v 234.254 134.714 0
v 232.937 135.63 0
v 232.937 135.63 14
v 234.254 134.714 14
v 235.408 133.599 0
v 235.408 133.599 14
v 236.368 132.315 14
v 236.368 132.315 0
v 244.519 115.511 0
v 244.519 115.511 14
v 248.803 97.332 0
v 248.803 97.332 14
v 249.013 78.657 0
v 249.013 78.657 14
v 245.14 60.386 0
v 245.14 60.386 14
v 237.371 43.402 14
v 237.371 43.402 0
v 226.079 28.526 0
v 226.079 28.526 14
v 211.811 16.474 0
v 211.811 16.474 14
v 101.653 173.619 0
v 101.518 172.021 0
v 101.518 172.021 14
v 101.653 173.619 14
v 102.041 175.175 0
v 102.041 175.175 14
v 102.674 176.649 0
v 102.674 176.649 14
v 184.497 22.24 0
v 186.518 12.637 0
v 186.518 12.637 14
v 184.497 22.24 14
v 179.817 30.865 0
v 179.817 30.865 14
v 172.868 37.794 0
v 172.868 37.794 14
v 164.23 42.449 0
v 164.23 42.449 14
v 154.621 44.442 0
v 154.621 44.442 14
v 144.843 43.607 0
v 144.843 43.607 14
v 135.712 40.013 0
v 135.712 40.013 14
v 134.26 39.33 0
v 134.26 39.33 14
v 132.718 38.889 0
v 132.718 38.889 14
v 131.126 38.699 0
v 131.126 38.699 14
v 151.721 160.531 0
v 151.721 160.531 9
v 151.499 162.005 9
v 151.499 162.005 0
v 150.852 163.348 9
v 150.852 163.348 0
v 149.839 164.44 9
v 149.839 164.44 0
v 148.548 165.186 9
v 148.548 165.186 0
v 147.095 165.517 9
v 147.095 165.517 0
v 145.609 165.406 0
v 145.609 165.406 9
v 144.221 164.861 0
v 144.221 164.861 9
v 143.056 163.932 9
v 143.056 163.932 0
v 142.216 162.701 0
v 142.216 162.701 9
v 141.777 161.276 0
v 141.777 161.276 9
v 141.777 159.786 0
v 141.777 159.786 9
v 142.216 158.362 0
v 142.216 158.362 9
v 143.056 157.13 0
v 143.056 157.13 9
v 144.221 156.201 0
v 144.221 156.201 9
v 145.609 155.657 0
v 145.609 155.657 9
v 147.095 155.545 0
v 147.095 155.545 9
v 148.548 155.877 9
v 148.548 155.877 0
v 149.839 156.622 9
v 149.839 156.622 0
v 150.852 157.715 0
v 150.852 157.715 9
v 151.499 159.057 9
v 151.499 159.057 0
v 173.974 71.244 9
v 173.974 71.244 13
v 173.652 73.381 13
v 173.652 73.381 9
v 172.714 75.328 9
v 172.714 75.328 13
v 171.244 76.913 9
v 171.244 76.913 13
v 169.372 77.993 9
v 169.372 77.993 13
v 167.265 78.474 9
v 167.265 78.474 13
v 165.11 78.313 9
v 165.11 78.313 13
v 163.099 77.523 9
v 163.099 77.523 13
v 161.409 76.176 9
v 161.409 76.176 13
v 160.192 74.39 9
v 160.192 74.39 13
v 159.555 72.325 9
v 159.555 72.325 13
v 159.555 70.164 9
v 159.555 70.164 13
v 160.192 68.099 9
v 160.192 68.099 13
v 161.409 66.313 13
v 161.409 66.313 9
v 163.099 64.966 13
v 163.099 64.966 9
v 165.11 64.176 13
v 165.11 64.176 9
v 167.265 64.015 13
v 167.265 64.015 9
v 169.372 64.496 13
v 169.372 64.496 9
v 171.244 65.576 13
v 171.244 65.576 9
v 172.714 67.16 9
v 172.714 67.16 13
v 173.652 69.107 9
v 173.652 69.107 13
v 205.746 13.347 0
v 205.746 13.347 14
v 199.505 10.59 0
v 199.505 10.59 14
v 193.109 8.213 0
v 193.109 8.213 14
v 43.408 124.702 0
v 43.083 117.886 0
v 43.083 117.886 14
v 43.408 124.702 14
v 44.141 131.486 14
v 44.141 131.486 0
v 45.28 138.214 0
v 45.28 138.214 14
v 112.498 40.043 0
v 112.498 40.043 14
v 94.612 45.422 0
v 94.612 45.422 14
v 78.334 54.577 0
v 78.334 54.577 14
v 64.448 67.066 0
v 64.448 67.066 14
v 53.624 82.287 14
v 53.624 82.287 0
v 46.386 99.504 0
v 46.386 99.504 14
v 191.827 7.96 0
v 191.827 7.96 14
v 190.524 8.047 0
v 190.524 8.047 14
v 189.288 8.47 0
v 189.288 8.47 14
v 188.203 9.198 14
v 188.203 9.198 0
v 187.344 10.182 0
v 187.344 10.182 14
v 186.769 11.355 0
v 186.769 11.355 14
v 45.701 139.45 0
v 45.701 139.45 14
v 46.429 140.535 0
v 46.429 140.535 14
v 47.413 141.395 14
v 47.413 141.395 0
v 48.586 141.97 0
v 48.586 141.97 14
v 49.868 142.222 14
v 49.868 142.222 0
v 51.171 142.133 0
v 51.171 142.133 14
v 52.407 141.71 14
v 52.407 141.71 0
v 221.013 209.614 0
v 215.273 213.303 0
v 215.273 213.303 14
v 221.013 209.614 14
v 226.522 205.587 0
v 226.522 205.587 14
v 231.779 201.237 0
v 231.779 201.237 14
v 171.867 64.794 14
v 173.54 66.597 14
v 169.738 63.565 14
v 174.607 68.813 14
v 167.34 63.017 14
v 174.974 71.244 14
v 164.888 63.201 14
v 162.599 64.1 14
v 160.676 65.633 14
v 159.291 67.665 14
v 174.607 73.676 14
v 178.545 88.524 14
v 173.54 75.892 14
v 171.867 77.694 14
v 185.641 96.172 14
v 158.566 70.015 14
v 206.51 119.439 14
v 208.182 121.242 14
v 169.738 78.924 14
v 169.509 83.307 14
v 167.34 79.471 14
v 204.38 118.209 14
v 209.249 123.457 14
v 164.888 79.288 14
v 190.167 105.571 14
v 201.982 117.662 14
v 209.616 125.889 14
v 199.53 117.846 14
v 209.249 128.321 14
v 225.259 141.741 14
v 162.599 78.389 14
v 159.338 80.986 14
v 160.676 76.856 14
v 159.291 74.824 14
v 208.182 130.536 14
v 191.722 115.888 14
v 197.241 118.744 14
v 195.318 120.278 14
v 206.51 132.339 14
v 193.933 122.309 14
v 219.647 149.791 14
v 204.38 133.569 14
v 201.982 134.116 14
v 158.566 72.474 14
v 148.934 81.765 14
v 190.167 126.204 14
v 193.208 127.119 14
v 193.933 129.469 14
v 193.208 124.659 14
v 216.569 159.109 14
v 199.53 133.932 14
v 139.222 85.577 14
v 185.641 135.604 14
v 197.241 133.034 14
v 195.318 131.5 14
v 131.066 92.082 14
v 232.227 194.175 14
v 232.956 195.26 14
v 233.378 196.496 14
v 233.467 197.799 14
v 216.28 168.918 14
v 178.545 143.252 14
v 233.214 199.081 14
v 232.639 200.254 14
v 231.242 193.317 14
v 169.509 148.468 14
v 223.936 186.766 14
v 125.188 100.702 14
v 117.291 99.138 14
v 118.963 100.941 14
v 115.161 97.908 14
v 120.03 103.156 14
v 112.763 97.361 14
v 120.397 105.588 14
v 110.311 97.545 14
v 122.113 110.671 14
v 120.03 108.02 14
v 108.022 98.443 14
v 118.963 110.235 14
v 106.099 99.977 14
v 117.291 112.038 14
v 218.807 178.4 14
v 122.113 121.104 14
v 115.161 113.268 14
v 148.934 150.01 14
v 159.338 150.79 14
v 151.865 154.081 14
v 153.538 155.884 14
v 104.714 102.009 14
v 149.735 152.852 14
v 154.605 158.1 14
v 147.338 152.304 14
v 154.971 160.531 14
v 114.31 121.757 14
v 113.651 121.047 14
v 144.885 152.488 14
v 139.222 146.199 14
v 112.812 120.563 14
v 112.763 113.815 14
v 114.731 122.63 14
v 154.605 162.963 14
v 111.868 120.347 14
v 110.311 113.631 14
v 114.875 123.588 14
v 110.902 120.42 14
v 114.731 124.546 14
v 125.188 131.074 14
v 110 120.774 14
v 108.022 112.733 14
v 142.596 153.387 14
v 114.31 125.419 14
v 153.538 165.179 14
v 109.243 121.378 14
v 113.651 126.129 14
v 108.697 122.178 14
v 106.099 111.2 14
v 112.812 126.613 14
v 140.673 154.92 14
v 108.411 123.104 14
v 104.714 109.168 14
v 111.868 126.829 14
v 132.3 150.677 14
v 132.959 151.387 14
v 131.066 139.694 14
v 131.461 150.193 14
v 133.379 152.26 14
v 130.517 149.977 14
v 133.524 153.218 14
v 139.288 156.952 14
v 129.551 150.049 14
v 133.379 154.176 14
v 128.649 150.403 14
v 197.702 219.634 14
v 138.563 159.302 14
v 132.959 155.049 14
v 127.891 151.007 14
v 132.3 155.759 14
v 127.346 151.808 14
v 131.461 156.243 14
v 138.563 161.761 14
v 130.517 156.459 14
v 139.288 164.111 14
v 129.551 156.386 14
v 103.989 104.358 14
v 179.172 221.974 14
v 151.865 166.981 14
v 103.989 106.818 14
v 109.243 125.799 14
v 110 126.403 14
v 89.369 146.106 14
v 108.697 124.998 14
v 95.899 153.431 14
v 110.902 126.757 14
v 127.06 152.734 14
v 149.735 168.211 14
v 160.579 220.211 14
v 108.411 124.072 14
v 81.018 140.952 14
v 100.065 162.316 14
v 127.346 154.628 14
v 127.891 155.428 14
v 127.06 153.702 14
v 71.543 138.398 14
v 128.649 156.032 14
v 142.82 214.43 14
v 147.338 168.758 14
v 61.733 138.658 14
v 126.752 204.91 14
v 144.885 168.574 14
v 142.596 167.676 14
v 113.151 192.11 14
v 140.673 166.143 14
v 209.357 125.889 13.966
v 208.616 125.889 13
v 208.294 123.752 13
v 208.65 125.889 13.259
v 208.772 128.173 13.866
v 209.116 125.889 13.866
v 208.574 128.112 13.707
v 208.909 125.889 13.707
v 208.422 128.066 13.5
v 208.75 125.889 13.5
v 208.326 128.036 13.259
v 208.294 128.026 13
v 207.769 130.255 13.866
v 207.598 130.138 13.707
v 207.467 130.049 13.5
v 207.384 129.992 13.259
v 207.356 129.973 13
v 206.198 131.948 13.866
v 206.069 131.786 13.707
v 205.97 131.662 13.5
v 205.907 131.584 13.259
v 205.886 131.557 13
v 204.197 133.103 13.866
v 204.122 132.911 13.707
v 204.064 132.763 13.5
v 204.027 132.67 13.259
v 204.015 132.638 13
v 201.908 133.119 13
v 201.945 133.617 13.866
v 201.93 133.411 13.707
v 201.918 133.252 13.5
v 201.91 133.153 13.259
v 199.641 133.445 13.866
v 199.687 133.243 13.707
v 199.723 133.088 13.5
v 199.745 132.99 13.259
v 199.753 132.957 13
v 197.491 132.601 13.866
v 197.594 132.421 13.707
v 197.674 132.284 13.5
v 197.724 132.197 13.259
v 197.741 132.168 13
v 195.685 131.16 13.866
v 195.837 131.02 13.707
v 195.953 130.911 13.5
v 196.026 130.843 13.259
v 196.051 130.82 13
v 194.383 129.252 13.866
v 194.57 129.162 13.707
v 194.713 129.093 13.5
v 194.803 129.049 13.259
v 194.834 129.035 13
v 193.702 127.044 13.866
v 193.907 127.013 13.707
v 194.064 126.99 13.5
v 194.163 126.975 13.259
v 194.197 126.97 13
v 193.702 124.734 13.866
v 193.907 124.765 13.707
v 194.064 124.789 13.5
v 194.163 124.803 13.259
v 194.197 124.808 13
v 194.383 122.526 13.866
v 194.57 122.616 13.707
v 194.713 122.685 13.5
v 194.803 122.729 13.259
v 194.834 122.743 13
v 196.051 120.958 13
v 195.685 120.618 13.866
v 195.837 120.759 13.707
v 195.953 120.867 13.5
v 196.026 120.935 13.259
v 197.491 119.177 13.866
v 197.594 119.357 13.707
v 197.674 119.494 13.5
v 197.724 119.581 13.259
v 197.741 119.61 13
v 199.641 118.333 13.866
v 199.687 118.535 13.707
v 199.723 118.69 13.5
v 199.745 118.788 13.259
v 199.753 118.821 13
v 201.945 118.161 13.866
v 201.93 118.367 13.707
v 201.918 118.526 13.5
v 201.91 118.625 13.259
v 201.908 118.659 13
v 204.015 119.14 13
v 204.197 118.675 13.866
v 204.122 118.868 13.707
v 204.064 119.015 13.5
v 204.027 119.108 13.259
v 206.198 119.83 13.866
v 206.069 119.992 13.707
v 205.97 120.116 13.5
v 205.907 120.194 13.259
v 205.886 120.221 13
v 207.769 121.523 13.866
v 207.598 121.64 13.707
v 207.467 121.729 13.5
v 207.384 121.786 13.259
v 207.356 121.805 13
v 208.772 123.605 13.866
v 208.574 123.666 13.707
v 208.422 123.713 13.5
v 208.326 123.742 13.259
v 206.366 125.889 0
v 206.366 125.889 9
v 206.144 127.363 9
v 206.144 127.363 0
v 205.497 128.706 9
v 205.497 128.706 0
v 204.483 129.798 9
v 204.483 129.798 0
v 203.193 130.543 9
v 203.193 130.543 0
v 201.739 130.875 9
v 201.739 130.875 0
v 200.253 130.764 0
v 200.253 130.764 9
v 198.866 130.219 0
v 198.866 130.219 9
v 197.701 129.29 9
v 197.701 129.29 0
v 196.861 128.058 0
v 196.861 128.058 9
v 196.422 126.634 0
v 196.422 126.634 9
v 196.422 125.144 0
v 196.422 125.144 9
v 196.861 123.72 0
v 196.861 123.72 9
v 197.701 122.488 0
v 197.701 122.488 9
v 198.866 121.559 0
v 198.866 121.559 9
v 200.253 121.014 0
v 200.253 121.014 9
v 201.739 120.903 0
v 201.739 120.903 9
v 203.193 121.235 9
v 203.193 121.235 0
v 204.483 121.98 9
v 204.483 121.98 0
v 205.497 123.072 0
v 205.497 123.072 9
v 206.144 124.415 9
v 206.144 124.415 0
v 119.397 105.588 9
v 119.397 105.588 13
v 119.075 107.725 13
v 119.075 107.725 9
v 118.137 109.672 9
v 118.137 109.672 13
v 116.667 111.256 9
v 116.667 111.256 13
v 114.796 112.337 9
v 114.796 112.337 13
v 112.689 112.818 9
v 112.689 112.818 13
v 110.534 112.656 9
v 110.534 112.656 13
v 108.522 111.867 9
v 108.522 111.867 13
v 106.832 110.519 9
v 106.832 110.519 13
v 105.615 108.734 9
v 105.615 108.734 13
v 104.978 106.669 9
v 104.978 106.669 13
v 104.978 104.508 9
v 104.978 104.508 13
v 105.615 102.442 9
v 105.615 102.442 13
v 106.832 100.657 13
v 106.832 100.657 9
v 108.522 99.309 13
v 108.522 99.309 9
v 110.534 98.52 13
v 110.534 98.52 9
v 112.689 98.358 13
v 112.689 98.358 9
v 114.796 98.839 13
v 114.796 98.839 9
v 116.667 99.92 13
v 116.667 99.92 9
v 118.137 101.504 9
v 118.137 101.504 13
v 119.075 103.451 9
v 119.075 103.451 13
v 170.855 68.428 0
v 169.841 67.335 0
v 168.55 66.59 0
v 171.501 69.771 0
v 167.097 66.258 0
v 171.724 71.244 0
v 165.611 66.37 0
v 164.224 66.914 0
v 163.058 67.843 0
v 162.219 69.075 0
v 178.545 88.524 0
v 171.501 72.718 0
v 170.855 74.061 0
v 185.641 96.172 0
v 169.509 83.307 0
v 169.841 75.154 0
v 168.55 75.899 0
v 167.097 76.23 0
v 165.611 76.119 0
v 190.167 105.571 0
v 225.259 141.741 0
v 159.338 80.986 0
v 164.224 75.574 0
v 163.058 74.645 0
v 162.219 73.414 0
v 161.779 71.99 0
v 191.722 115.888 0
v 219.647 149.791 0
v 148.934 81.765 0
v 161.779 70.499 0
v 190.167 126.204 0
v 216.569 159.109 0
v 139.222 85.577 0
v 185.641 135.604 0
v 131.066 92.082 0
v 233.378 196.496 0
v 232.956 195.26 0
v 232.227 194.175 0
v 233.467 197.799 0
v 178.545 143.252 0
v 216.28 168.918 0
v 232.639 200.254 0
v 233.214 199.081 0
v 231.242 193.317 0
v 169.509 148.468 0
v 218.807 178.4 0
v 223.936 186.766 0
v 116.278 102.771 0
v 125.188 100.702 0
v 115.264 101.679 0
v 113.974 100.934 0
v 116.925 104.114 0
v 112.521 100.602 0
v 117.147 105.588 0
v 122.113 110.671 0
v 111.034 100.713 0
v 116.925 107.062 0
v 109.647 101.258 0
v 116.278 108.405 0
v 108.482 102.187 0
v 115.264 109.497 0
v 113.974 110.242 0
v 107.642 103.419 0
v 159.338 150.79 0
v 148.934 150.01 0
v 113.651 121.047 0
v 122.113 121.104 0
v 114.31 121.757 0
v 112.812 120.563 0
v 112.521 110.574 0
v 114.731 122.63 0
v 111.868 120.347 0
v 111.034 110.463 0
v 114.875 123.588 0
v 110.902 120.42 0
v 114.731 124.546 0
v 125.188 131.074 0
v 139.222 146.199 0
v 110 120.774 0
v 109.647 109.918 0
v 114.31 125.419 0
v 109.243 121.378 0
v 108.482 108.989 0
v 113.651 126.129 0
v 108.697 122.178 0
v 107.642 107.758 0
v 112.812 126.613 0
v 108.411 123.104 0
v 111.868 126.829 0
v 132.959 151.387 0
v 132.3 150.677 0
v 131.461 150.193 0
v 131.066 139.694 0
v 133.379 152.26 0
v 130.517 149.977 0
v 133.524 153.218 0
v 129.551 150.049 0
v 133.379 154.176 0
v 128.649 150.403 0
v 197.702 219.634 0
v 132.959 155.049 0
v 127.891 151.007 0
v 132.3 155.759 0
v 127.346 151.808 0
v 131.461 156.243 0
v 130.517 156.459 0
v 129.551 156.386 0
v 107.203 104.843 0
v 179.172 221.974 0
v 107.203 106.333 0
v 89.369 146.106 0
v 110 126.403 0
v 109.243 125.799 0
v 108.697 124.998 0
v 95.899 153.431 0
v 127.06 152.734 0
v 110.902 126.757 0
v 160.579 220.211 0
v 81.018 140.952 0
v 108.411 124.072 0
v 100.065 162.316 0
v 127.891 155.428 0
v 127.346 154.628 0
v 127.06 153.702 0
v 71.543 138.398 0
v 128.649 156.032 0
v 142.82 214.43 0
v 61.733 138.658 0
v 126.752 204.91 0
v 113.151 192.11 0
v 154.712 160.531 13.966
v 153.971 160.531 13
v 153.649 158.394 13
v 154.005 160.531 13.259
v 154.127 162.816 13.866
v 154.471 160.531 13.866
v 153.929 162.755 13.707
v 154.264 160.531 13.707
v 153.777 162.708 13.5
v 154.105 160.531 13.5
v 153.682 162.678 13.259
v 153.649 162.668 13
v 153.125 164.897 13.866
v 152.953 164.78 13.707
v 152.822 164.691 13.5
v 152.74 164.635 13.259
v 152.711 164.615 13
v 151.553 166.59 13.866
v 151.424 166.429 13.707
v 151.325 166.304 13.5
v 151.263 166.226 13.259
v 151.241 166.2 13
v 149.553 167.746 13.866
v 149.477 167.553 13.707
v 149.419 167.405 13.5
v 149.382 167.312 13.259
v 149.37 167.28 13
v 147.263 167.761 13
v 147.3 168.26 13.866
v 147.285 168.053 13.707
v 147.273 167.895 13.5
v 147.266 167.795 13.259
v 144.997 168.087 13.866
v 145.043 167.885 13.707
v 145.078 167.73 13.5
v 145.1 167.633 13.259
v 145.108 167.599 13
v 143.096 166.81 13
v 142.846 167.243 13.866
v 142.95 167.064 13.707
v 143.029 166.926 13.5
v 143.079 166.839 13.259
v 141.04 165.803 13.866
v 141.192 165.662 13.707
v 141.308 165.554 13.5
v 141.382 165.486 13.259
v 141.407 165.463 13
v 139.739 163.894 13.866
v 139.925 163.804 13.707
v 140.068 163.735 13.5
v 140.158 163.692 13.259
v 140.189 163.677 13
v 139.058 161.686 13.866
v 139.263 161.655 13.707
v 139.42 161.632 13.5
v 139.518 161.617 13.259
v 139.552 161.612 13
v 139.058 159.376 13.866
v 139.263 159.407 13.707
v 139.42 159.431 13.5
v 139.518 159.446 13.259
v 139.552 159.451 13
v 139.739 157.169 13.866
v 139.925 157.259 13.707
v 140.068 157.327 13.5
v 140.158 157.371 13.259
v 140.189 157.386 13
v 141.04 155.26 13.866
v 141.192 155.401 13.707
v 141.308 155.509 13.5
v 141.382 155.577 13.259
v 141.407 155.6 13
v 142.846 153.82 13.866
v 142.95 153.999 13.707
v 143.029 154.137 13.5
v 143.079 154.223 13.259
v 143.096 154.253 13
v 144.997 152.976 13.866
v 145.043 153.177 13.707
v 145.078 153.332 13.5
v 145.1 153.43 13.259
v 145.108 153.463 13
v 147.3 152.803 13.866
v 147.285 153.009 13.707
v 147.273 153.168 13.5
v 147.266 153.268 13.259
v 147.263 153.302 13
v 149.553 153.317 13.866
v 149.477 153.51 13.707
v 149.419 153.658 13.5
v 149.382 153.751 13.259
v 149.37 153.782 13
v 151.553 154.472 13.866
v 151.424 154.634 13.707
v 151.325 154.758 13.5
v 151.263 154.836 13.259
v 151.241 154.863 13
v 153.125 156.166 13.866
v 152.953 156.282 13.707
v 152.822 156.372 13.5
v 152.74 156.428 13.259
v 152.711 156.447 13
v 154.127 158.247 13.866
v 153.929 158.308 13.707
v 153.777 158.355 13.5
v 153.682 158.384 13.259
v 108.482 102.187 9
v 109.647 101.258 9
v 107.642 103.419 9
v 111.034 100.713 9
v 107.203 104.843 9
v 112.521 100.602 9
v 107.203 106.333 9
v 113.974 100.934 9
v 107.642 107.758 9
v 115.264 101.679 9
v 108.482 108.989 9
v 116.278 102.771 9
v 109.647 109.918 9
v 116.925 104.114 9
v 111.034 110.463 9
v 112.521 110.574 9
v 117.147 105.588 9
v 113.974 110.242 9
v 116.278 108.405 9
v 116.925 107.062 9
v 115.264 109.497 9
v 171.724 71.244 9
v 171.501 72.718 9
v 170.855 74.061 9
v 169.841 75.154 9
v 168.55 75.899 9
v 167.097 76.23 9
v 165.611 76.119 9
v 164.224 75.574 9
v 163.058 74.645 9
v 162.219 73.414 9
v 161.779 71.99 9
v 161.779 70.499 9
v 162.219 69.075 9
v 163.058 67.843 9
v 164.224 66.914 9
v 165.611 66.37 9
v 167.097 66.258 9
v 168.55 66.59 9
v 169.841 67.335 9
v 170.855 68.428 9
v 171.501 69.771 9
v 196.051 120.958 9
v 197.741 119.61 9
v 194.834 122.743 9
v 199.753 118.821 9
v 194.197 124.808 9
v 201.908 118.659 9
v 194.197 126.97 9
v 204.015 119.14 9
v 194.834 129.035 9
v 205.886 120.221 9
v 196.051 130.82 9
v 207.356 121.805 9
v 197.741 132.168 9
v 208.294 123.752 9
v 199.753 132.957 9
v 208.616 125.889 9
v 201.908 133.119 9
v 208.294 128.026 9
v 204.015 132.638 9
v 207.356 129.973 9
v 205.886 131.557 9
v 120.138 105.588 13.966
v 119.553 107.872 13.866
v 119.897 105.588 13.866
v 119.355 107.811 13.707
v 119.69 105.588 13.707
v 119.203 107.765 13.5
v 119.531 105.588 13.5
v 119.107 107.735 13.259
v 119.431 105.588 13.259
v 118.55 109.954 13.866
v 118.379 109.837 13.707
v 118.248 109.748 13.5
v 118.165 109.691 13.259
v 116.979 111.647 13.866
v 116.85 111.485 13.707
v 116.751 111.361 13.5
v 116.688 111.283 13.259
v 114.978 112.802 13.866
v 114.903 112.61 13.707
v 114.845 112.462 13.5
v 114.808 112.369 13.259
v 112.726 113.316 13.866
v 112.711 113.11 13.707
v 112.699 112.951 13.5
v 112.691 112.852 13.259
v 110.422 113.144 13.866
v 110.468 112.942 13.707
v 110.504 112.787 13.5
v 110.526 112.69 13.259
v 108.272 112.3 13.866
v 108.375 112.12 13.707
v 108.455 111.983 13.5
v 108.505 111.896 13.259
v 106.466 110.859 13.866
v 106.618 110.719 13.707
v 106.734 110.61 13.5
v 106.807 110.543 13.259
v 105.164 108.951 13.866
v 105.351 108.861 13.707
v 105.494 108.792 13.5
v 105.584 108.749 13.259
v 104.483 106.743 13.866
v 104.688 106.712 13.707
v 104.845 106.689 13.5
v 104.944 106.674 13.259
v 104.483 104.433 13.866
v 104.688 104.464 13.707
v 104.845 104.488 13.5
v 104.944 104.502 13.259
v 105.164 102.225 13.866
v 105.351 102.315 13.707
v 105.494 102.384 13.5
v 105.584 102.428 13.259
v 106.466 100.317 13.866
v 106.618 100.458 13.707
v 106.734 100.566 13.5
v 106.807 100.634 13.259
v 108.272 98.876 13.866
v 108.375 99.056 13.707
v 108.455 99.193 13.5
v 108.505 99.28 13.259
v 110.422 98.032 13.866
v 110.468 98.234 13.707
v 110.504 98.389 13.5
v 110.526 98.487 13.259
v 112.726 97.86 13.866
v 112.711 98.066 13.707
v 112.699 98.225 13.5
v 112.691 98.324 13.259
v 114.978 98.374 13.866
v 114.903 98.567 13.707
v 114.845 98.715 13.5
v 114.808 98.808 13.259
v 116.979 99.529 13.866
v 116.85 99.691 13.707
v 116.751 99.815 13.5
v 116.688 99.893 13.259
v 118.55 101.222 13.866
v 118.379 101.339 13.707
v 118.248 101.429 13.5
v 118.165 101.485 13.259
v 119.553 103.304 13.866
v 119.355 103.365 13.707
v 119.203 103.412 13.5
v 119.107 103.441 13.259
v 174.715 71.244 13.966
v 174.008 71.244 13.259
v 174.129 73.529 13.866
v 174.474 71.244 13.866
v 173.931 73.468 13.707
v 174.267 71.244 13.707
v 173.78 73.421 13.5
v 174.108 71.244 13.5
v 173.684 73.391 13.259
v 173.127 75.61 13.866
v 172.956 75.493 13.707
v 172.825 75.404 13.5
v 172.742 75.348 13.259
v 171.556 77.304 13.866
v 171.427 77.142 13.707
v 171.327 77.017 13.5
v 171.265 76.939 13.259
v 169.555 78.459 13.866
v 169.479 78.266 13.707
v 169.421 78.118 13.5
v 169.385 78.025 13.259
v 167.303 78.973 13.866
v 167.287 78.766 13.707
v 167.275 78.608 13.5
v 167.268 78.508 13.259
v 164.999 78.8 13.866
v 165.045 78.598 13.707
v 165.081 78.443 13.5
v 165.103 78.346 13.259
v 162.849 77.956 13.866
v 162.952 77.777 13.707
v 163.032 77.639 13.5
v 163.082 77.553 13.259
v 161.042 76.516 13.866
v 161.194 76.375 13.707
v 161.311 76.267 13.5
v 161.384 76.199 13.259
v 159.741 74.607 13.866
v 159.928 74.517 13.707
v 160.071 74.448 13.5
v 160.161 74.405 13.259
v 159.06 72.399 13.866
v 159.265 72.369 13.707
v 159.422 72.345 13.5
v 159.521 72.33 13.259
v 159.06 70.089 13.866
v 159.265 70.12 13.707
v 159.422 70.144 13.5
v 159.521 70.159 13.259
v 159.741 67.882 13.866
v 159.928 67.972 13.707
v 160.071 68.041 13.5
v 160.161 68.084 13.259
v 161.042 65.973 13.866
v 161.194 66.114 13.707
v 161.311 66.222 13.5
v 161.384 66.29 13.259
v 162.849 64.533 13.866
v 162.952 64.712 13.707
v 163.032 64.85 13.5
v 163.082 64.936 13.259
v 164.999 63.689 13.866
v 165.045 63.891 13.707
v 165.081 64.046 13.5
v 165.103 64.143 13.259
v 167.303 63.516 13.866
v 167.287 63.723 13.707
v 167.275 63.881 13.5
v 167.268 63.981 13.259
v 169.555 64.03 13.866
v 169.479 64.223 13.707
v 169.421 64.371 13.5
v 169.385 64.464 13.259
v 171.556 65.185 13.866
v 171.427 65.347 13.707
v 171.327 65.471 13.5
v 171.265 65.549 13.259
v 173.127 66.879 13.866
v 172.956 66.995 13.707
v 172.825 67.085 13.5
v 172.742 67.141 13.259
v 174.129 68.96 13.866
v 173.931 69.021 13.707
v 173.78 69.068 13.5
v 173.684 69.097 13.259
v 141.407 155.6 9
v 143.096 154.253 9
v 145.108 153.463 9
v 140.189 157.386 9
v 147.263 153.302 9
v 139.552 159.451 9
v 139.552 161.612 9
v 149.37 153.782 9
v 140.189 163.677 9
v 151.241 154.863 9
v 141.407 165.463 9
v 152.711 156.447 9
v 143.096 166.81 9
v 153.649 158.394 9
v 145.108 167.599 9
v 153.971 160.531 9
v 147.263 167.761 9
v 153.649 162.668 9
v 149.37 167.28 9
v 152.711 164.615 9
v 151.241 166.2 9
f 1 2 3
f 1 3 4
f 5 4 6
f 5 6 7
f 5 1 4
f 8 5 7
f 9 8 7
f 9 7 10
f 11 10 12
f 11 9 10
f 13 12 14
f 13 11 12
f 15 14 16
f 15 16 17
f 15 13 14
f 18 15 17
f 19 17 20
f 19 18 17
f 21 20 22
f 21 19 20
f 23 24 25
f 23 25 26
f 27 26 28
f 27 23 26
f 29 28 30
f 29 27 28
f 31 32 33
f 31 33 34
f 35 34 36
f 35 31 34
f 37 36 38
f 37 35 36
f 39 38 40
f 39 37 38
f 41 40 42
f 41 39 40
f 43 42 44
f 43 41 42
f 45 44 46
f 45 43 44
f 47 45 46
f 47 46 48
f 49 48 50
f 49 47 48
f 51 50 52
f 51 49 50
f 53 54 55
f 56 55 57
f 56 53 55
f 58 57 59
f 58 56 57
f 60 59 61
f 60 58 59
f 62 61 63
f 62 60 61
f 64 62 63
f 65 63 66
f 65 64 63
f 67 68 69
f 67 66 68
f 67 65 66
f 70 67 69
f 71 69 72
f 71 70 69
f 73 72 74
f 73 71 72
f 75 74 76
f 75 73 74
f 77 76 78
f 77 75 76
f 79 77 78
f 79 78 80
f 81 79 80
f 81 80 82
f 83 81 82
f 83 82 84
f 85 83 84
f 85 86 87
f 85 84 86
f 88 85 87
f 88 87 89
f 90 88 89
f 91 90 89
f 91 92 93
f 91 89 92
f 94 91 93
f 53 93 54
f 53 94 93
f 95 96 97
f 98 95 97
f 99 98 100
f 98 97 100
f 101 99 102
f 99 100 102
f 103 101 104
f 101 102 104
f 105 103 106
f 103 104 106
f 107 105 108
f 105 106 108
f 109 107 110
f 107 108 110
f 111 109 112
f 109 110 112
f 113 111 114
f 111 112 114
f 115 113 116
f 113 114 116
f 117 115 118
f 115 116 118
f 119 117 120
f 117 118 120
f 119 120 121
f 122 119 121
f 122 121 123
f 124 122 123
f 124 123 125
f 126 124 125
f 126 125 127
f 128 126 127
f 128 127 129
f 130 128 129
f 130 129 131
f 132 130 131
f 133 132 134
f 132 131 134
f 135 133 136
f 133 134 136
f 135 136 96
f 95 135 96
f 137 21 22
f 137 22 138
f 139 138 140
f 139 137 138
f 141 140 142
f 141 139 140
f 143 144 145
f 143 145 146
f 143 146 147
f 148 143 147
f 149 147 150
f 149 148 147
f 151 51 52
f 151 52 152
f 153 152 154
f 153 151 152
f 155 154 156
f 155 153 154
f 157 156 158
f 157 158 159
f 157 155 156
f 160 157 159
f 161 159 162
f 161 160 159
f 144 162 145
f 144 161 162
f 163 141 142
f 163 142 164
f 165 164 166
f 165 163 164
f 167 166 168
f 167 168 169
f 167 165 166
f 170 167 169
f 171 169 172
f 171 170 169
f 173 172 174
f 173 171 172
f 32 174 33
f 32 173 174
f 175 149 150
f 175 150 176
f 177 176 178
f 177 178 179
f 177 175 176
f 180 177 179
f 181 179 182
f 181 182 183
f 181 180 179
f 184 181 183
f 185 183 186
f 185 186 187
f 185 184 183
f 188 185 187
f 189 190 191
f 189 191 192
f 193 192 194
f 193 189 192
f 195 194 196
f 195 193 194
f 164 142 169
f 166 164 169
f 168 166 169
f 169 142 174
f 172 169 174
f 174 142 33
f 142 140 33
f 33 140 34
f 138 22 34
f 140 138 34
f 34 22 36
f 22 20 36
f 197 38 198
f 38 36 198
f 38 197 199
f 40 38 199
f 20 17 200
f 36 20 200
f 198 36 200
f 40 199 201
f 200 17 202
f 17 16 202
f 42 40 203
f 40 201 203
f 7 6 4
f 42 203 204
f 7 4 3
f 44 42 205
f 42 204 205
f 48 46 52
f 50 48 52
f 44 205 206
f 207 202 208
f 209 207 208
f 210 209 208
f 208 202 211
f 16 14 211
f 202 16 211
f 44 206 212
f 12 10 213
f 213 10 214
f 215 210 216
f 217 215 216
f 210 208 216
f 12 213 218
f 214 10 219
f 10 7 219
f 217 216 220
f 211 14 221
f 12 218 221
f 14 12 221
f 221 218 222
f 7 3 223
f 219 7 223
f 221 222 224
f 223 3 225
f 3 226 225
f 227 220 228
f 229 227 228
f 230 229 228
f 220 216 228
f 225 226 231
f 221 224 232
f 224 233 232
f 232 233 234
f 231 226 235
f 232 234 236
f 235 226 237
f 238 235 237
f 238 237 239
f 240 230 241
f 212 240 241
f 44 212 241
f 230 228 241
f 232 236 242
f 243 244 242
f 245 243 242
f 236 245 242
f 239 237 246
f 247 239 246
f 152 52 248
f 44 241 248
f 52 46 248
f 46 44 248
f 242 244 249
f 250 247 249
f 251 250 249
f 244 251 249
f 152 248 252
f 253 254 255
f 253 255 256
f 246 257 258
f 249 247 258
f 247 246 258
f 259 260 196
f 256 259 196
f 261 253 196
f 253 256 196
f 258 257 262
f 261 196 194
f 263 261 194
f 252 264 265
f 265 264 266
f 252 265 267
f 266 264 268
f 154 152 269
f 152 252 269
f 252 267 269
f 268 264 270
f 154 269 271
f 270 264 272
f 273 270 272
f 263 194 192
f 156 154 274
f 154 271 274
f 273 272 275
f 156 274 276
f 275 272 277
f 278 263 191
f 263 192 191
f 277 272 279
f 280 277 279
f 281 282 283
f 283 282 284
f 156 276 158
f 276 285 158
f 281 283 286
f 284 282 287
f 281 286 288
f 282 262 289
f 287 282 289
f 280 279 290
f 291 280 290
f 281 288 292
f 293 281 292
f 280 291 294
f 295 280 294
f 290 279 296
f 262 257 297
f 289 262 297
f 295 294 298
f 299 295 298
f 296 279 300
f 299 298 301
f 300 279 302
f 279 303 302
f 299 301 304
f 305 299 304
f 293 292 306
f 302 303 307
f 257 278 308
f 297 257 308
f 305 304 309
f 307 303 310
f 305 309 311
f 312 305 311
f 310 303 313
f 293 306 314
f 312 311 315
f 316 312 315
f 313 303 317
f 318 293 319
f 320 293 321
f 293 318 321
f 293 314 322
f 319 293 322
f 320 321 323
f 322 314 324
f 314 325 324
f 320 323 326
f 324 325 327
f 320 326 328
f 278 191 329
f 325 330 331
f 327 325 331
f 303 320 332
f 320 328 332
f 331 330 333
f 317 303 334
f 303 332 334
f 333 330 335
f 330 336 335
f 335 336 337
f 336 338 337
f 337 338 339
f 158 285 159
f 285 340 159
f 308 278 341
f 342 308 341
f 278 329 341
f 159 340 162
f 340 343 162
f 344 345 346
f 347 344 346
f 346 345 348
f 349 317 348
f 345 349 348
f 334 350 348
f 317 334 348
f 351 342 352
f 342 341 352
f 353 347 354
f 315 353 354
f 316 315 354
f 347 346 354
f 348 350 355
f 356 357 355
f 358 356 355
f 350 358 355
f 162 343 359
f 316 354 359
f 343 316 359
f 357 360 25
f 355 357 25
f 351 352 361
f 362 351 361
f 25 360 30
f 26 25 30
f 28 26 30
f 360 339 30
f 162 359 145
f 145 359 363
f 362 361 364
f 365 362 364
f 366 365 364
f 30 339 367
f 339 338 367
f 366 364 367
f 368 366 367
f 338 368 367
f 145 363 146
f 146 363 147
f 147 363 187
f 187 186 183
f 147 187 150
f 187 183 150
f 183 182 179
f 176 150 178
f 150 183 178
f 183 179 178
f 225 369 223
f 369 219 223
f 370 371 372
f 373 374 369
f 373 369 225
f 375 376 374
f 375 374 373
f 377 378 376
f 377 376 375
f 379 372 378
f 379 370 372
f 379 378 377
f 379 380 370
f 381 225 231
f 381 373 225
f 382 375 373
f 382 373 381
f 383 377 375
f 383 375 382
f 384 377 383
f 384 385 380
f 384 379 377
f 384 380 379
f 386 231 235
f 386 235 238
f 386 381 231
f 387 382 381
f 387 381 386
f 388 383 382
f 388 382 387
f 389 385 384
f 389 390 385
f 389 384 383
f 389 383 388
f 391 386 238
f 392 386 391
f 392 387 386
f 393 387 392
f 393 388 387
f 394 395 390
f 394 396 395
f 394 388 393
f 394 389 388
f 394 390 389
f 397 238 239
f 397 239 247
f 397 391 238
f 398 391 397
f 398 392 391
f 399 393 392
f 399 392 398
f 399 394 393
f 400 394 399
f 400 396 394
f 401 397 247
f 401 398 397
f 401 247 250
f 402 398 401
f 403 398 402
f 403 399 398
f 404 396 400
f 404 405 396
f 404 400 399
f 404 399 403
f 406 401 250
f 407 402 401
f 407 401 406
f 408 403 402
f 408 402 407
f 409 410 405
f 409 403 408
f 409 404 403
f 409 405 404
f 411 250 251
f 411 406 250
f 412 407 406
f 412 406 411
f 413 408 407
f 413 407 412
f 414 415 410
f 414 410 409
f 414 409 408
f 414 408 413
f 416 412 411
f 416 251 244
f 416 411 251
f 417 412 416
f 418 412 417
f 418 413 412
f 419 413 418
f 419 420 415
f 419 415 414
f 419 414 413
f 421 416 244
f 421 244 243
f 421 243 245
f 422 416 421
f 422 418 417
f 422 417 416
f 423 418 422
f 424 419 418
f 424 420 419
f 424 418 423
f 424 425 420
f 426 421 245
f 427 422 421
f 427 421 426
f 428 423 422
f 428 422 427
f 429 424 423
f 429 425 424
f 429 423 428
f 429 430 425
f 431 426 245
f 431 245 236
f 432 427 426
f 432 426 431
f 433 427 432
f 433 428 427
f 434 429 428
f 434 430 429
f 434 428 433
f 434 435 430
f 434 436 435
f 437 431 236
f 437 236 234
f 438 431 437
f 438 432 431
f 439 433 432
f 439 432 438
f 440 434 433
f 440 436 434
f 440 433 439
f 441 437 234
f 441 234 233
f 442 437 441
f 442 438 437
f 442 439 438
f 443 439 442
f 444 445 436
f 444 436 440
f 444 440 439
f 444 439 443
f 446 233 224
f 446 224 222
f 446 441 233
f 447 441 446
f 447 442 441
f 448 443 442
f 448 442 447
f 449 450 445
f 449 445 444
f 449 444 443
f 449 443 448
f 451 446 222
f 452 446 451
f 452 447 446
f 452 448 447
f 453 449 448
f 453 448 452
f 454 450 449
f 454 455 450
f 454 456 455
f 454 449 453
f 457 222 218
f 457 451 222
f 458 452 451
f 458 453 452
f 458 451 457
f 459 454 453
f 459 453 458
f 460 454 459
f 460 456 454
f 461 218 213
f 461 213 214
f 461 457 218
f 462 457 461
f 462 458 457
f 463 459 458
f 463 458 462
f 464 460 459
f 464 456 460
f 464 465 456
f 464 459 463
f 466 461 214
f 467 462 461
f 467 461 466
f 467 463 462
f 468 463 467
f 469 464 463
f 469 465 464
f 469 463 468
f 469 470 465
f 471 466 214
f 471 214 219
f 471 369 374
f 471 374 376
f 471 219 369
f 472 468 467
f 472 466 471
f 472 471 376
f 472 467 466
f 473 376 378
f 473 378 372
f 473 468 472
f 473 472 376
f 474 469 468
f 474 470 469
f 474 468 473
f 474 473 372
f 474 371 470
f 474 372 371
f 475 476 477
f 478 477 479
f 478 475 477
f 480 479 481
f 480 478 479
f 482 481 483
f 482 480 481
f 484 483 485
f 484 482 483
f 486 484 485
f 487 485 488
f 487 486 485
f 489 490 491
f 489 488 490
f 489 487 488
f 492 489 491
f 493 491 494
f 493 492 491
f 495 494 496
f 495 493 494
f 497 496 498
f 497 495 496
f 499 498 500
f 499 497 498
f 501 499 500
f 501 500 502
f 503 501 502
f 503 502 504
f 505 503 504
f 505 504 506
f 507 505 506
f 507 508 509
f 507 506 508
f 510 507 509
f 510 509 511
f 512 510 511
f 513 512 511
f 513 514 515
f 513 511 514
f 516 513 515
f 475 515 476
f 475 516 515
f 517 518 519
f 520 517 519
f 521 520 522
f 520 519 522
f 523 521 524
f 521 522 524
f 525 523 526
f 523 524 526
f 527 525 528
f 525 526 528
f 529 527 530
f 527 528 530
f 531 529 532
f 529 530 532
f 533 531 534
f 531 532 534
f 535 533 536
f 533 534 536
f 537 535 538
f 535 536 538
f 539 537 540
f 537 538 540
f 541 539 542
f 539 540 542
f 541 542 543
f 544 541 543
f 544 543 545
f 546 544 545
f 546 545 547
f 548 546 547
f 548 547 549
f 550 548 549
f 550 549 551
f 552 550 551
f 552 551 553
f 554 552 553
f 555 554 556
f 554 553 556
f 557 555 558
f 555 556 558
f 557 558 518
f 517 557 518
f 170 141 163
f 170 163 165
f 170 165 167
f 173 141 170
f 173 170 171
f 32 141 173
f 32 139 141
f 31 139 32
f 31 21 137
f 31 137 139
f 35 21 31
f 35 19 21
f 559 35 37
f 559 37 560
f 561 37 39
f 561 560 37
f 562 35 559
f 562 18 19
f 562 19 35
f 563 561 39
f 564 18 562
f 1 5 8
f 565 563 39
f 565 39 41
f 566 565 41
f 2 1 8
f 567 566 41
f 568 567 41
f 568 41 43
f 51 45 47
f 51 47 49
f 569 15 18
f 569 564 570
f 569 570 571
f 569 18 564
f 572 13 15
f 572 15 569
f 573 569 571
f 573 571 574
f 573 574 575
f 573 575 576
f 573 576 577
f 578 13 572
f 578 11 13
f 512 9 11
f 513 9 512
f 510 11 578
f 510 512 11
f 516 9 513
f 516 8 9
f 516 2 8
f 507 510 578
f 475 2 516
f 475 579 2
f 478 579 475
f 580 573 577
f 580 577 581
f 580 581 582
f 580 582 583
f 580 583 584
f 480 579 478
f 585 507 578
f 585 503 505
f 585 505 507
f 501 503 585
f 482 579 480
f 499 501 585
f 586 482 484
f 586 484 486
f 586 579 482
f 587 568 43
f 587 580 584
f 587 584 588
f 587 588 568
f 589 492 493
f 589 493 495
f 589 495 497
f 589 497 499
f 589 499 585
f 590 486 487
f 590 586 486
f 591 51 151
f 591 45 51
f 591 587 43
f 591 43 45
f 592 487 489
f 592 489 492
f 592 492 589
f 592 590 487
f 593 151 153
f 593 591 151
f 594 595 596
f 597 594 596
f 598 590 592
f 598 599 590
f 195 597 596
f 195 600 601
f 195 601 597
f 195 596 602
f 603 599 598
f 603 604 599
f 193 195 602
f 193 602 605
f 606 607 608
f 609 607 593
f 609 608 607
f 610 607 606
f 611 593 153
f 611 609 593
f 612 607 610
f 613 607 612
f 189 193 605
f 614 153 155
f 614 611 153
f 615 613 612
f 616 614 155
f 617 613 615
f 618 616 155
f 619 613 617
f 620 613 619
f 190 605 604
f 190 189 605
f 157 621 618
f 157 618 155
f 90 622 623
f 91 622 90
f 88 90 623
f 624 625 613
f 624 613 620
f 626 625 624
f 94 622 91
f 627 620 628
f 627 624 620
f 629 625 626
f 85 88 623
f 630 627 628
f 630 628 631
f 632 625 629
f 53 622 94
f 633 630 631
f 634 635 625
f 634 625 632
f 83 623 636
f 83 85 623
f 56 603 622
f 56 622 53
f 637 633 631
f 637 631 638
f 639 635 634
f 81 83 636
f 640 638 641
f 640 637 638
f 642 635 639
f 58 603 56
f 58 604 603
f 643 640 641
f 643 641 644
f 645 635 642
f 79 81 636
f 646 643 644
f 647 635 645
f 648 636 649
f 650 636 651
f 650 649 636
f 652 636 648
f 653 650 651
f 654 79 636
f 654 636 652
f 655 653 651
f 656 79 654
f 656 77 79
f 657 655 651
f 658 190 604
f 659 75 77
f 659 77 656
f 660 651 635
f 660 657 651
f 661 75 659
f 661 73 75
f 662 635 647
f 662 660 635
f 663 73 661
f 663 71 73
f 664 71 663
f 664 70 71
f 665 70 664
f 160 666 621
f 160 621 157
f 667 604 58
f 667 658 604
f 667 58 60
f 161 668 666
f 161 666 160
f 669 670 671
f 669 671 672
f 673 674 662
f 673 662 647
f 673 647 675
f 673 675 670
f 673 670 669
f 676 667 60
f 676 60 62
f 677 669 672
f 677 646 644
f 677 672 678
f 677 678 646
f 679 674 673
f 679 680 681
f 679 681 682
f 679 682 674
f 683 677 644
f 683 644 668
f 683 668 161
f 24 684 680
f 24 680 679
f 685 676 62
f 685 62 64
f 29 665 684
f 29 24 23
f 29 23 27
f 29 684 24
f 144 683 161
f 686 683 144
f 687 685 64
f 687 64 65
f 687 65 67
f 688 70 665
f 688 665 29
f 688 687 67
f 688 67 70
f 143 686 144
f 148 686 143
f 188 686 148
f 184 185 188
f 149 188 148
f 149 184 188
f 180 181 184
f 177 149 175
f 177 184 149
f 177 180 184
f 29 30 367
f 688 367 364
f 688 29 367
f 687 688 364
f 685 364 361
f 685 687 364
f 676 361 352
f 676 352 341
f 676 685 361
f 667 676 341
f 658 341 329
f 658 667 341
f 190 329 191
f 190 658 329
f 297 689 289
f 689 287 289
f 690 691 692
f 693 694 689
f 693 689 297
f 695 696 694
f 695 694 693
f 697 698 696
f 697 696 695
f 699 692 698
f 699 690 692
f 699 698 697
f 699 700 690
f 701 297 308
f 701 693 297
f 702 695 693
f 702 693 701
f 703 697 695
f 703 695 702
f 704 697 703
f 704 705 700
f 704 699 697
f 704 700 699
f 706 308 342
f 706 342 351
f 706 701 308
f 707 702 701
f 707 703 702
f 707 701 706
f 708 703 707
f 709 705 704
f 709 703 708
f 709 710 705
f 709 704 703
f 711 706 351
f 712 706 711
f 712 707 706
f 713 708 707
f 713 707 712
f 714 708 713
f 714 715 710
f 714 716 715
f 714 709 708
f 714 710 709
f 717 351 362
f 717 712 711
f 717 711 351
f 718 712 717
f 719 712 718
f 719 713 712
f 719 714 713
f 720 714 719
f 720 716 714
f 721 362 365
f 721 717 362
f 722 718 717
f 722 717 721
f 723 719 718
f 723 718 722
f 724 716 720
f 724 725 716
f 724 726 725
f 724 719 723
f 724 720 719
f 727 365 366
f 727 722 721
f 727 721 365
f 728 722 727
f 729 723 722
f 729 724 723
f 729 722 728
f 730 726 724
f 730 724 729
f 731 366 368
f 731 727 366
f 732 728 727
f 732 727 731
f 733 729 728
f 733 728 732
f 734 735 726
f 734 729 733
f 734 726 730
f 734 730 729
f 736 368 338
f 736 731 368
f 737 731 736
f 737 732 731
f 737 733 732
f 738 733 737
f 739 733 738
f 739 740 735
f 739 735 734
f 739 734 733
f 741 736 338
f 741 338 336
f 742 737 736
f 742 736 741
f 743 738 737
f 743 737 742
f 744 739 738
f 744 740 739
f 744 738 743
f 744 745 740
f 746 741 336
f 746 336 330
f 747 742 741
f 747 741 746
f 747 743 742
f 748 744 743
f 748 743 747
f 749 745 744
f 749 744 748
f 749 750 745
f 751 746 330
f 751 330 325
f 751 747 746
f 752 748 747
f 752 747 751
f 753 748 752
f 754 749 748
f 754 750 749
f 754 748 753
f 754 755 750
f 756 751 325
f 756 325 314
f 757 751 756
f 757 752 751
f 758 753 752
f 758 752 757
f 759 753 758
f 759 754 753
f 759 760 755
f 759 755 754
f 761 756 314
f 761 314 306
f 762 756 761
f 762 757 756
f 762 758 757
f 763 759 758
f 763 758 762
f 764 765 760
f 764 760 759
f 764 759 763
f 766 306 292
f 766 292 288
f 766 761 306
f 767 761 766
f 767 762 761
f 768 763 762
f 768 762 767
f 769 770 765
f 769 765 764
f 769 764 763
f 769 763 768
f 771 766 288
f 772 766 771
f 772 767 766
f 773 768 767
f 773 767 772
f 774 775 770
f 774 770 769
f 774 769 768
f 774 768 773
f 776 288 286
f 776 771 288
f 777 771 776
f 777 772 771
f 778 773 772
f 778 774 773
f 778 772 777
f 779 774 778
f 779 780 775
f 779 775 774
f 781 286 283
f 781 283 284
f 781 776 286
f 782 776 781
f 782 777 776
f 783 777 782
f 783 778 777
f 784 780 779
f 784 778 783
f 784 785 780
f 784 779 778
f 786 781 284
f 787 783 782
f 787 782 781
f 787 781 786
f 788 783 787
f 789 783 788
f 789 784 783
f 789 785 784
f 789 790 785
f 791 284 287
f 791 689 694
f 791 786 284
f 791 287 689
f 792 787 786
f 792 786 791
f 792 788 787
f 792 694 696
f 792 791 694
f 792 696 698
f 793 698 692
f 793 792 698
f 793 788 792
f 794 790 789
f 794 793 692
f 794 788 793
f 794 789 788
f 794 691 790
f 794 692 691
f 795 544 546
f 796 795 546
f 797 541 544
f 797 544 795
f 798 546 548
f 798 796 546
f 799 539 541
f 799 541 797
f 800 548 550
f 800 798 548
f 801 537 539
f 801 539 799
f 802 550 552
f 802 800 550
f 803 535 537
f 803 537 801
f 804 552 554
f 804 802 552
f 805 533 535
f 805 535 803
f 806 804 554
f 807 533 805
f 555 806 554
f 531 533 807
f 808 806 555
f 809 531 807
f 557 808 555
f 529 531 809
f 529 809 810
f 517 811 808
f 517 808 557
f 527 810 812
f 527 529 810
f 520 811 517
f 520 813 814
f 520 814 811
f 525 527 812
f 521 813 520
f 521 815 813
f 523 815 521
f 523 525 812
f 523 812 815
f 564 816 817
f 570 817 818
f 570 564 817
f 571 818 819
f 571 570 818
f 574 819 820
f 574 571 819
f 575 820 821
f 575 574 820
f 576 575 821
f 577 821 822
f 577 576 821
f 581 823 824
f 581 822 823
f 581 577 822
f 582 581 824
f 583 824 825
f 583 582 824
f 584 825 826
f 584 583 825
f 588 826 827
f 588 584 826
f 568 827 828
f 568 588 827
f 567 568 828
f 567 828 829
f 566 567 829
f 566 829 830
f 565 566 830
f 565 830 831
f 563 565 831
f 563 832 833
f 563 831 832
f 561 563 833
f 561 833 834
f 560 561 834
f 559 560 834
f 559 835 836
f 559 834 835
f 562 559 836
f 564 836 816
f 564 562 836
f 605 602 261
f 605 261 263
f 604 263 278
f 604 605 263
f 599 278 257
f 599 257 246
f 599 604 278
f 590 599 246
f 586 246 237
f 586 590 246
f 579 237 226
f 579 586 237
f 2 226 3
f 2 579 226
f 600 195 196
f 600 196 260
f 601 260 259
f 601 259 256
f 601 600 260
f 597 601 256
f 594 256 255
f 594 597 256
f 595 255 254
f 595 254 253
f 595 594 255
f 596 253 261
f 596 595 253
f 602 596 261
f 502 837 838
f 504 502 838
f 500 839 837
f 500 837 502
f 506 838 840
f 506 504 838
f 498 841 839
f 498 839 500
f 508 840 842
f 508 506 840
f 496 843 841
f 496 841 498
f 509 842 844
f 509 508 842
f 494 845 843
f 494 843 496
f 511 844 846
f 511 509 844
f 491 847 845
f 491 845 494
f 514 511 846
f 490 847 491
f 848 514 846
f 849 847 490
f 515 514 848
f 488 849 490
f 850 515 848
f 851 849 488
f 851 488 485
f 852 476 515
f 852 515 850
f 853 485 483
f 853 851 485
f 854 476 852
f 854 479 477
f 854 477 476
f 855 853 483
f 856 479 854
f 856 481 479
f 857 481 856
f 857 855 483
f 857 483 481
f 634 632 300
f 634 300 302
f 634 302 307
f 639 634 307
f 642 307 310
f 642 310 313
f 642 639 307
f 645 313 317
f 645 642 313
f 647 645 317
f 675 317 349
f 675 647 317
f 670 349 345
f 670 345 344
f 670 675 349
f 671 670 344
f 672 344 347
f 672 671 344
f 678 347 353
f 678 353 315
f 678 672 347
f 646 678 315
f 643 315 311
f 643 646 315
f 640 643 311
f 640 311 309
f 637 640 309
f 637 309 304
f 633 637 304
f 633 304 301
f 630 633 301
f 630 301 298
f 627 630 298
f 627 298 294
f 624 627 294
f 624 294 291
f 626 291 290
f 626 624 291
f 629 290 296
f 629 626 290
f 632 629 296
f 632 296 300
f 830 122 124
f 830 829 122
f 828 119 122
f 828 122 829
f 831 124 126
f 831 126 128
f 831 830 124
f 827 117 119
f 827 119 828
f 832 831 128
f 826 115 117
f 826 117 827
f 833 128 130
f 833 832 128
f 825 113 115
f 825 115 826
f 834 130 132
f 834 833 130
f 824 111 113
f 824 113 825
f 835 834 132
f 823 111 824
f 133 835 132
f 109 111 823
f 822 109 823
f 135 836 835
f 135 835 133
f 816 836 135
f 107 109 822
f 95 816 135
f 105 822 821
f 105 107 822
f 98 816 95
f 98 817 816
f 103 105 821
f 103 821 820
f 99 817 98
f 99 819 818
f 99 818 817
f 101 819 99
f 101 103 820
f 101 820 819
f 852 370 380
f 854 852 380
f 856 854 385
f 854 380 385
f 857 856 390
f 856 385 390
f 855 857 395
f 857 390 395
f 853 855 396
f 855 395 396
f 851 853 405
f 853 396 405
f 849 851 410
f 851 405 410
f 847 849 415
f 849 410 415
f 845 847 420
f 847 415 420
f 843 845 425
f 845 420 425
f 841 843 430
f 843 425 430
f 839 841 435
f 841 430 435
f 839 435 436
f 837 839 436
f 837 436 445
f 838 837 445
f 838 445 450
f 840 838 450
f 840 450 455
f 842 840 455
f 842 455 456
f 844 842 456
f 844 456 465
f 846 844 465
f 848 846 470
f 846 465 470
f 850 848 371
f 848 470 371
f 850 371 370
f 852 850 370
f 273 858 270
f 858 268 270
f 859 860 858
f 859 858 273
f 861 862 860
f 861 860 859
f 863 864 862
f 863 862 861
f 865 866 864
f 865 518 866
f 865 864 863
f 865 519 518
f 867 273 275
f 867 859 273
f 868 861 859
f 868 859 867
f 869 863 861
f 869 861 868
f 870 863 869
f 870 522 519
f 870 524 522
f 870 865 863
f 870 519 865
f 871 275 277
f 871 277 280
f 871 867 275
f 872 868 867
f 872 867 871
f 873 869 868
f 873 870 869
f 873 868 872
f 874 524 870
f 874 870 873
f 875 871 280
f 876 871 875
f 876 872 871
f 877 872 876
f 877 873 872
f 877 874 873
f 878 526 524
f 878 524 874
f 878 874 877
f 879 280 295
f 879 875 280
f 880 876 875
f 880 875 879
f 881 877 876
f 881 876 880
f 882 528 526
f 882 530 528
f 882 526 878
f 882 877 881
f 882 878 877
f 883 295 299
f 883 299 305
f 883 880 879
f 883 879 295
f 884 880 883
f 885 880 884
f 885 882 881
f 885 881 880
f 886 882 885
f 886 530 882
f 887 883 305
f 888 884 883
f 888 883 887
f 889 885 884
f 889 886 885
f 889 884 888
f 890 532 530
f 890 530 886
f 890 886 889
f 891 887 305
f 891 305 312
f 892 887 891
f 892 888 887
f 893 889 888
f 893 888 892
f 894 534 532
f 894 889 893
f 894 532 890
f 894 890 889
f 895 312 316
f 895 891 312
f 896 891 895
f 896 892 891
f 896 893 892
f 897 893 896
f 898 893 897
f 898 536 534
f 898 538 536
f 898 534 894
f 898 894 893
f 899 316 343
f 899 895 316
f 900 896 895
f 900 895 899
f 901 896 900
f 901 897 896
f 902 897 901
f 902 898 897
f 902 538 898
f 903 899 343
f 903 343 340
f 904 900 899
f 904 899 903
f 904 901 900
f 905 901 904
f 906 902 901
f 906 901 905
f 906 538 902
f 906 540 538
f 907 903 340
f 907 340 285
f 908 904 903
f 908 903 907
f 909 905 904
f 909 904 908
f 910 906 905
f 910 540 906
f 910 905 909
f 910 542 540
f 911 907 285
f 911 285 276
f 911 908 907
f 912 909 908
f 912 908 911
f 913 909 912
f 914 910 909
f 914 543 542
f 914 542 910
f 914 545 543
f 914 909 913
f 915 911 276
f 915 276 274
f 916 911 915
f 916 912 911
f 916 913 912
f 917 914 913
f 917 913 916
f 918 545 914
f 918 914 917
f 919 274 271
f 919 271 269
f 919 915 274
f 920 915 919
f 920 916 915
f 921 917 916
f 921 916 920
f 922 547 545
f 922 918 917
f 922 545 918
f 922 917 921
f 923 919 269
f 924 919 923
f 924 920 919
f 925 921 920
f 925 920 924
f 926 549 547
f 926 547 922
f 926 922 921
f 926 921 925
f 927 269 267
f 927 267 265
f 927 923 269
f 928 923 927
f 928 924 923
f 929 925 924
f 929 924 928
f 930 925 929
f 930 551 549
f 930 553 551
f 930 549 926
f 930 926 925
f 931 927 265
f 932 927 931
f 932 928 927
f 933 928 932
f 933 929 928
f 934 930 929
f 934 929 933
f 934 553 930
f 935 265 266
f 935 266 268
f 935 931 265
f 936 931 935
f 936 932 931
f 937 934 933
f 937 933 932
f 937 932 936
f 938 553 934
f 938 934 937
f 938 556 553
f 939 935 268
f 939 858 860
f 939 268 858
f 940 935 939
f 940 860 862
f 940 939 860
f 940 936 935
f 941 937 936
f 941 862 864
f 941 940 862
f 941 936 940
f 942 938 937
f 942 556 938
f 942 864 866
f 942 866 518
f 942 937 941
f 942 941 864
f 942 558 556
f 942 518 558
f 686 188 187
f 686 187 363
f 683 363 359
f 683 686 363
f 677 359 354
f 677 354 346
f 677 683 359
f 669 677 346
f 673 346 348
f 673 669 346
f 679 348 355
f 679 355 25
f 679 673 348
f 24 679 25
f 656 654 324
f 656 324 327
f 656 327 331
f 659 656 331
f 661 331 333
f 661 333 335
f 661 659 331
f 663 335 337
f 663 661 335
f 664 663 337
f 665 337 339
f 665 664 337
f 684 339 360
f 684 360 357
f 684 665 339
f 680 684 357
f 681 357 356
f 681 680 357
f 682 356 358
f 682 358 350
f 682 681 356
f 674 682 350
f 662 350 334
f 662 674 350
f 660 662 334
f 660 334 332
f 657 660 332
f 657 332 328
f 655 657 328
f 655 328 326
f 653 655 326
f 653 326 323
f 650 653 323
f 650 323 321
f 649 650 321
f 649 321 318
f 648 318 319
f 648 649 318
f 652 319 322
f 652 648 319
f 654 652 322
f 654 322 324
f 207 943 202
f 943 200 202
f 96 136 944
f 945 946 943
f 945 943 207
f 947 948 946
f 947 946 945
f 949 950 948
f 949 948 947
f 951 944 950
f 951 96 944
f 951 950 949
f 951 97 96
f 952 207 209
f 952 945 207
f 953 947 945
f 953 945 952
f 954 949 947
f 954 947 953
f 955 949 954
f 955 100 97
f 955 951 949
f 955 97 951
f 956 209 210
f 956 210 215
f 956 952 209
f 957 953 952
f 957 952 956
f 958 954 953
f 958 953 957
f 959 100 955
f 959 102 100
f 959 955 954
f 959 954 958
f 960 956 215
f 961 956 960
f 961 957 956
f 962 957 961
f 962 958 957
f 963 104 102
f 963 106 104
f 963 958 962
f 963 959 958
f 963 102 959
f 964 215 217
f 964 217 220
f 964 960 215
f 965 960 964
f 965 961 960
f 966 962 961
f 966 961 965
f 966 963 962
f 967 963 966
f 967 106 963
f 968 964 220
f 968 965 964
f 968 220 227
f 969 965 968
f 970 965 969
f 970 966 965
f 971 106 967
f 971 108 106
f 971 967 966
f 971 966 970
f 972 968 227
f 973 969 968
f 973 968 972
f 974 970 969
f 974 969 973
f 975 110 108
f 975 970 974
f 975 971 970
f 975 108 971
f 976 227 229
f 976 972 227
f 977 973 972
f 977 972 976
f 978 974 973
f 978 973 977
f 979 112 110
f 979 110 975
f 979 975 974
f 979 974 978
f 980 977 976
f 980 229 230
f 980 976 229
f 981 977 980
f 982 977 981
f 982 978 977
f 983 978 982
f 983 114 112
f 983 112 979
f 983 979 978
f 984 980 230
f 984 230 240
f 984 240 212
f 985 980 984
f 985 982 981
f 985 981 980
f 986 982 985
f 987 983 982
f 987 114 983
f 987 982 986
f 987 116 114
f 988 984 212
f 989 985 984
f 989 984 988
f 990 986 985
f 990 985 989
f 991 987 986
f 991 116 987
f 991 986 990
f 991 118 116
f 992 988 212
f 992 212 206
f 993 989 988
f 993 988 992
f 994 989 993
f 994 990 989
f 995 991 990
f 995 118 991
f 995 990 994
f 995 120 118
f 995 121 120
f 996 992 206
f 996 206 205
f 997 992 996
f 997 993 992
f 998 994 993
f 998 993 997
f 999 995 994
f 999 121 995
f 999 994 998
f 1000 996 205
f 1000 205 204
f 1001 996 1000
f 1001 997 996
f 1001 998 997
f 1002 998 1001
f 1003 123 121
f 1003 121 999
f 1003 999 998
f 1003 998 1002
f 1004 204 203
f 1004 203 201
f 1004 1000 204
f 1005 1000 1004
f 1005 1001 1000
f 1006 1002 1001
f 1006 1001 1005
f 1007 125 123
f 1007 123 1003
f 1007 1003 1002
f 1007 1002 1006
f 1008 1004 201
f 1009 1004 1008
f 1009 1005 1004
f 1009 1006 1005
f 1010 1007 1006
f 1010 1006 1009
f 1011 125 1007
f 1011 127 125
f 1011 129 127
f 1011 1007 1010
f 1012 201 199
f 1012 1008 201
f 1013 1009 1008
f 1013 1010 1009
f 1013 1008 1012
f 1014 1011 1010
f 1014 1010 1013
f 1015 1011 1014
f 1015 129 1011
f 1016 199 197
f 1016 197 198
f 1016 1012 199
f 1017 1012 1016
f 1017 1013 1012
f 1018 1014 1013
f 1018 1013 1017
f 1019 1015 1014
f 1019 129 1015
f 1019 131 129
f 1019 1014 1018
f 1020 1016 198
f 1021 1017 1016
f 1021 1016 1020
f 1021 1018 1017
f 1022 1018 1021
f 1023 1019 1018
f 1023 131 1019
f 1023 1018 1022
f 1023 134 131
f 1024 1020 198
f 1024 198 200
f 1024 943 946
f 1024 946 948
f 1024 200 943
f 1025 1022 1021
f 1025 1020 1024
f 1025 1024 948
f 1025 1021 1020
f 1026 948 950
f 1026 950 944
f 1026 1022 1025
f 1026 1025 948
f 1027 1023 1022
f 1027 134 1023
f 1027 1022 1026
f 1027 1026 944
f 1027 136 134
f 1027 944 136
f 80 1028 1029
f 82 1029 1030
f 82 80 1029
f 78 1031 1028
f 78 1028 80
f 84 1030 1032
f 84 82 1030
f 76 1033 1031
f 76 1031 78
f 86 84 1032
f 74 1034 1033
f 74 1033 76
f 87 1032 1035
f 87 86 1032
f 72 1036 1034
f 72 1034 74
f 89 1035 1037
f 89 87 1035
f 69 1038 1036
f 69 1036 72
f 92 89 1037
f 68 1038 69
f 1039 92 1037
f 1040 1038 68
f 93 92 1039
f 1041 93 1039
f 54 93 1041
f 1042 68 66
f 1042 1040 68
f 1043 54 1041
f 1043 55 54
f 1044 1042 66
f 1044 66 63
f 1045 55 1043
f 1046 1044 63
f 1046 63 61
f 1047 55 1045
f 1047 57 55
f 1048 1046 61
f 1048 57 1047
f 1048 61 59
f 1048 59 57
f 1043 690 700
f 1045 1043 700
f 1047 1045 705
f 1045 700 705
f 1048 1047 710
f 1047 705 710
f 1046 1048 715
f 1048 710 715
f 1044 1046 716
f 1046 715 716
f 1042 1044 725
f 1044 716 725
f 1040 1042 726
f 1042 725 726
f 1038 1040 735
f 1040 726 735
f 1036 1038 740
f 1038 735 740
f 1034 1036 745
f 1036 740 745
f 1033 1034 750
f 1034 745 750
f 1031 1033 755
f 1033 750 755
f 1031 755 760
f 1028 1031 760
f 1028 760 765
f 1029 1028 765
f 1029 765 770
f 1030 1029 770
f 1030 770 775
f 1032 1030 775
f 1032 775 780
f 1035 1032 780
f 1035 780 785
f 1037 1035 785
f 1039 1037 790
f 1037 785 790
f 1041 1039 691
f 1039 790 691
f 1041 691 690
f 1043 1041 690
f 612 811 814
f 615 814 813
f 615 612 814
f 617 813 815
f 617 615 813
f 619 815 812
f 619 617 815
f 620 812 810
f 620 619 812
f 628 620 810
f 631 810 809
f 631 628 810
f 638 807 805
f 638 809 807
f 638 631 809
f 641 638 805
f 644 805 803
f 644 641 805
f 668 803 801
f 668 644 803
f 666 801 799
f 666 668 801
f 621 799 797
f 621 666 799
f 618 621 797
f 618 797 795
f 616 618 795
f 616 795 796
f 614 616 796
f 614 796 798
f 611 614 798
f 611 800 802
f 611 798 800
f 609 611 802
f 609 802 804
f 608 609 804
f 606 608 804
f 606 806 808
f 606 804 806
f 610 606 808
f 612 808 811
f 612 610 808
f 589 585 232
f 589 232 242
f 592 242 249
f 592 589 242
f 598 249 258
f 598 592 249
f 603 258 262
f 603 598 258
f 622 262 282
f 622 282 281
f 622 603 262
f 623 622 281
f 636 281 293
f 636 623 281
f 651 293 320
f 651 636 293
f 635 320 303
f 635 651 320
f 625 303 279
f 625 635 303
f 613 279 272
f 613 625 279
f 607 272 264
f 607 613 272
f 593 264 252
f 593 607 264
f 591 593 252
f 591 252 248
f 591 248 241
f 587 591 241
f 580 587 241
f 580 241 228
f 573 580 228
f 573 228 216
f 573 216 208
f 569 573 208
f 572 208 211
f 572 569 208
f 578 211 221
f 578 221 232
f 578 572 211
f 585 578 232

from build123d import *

# Parameters (mm, degrees)
SKETCH4_R             = 3.25
SKETCH4_R_2           = 5
SKETCH4_R_3           = 35
BOSS_EXTRUDE2_DEPTH   = 14
ESBO_O3_R             = 7.25
CORTE_EXTRUS_O1_DEPTH = 5
FILETE2_R             = 1


with BuildPart() as part:
    # Sketch4 → Boss-Extrude2 (new body)
    with BuildSketch(Plane.XY):
        with BuildLine():
            ThreePointArc((135.711956254, 40.012906067), (133.498311811, 39.078606258), (131.125704093, 38.699303642))
            ThreePointArc((131.125704093, 38.699303642), (71.046587381, 60.439214017), (43.082934706, 117.886216524))
            ThreePointArc((43.082934706, 117.886216524), (43.723303204, 128.09951793), (45.279720546, 138.213822774))
            ThreePointArc((45.279720546, 138.213822774), (47.980485983, 141.720753121), (52.406835354, 141.709543754))
            ThreePointArc((52.406835354, 141.709543754), (85.380644245, 143.225752695), (101.518008582, 172.020829263))
            ThreePointArc((101.518008582, 172.020829263), (101.815703435, 174.405051491), (102.673521593, 176.649441355))
            ThreePointArc((102.673521593, 176.649441355), (151.540394609, 217.809527477), (215.272784489, 213.303259824))
            ThreePointArc((215.272784489, 213.303259824), (223.797578714, 207.642033733), (231.77861498, 201.236984354))
            ThreePointArc((231.77861498, 201.236984354), (233.465323031, 197.144587703), (231.242440749, 193.316861385))
            ThreePointArc((231.242440749, 193.316861385), (216.068611764, 164.002600755), (232.937197408, 135.629695005))
            ThreePointArc((232.937197408, 135.629695005), (234.853146998, 134.179772586), (236.367936558, 132.314685337))
            ThreePointArc((236.367936558, 132.314685337), (247.580180254, 69.414688841), (211.811443049, 16.473953987))
            ThreePointArc((211.811443049, 16.473953987), (202.646280326, 11.921878672), (193.108826719, 8.212623207))
            ThreePointArc((193.108826719, 8.212623207), (188.72135323, 8.798089511), (186.517886141, 12.637025196))
            ThreePointArc((186.517886141, 12.637025196), (168.717906235, 40.435076885), (135.711956254, 40.012906067))
        make_face()
        with Locations((111.625067893, 123.588087508)):
            Circle(SKETCH4_R, mode=Mode.SUBTRACT)
        with Locations((146.721161104, 160.531263969)):
            Circle(SKETCH4_R_2, mode=Mode.SUBTRACT)
        with Locations((112.146853607, 105.588087508)):
            Circle(SKETCH4_R_2, mode=Mode.SUBTRACT)
        with Locations((166.723613726, 71.244356255)):
            Circle(SKETCH4_R_2, mode=Mode.SUBTRACT)
        with Locations((130.273826669, 153.217907011)):
            Circle(SKETCH4_R, mode=Mode.SUBTRACT)
        with Locations((201.365841272, 125.889036422)):
            Circle(SKETCH4_R_2, mode=Mode.SUBTRACT)
        with Locations((156.722387415, 115.887810112)):
            Circle(SKETCH4_R_3, mode=Mode.SUBTRACT)
    extrude(amount=BOSS_EXTRUDE2_DEPTH)

    # Esboço3 → Corte-extrusão1 (cut)
    with BuildSketch(Plane.XY.offset(14)):
        with Locations((201.365841272, 125.889036422)):
            Circle(ESBO_O3_R)
        with Locations((146.721161104, 160.531263969)):
            Circle(ESBO_O3_R)
        with Locations((112.146853607, 105.588087508)):
            Circle(ESBO_O3_R)
        with Locations((166.723613726, 71.244356255)):
            Circle(ESBO_O3_R)
    extrude(amount=-CORTE_EXTRUS_O1_DEPTH, mode=Mode.SUBTRACT)

    # Filete2
    filete2_edges = [part.edges().sort_by_distance(p)[0] for p in [
        (194.115841272, 125.889036422, 14),
        (139.471161104, 160.531263969, 14),
        (104.896853607, 105.588087508, 14),
        (159.473613726, 71.244356255, 14),
    ]]
    fillet(filete2_edges, radius=FILETE2_R)


solid = part.part
